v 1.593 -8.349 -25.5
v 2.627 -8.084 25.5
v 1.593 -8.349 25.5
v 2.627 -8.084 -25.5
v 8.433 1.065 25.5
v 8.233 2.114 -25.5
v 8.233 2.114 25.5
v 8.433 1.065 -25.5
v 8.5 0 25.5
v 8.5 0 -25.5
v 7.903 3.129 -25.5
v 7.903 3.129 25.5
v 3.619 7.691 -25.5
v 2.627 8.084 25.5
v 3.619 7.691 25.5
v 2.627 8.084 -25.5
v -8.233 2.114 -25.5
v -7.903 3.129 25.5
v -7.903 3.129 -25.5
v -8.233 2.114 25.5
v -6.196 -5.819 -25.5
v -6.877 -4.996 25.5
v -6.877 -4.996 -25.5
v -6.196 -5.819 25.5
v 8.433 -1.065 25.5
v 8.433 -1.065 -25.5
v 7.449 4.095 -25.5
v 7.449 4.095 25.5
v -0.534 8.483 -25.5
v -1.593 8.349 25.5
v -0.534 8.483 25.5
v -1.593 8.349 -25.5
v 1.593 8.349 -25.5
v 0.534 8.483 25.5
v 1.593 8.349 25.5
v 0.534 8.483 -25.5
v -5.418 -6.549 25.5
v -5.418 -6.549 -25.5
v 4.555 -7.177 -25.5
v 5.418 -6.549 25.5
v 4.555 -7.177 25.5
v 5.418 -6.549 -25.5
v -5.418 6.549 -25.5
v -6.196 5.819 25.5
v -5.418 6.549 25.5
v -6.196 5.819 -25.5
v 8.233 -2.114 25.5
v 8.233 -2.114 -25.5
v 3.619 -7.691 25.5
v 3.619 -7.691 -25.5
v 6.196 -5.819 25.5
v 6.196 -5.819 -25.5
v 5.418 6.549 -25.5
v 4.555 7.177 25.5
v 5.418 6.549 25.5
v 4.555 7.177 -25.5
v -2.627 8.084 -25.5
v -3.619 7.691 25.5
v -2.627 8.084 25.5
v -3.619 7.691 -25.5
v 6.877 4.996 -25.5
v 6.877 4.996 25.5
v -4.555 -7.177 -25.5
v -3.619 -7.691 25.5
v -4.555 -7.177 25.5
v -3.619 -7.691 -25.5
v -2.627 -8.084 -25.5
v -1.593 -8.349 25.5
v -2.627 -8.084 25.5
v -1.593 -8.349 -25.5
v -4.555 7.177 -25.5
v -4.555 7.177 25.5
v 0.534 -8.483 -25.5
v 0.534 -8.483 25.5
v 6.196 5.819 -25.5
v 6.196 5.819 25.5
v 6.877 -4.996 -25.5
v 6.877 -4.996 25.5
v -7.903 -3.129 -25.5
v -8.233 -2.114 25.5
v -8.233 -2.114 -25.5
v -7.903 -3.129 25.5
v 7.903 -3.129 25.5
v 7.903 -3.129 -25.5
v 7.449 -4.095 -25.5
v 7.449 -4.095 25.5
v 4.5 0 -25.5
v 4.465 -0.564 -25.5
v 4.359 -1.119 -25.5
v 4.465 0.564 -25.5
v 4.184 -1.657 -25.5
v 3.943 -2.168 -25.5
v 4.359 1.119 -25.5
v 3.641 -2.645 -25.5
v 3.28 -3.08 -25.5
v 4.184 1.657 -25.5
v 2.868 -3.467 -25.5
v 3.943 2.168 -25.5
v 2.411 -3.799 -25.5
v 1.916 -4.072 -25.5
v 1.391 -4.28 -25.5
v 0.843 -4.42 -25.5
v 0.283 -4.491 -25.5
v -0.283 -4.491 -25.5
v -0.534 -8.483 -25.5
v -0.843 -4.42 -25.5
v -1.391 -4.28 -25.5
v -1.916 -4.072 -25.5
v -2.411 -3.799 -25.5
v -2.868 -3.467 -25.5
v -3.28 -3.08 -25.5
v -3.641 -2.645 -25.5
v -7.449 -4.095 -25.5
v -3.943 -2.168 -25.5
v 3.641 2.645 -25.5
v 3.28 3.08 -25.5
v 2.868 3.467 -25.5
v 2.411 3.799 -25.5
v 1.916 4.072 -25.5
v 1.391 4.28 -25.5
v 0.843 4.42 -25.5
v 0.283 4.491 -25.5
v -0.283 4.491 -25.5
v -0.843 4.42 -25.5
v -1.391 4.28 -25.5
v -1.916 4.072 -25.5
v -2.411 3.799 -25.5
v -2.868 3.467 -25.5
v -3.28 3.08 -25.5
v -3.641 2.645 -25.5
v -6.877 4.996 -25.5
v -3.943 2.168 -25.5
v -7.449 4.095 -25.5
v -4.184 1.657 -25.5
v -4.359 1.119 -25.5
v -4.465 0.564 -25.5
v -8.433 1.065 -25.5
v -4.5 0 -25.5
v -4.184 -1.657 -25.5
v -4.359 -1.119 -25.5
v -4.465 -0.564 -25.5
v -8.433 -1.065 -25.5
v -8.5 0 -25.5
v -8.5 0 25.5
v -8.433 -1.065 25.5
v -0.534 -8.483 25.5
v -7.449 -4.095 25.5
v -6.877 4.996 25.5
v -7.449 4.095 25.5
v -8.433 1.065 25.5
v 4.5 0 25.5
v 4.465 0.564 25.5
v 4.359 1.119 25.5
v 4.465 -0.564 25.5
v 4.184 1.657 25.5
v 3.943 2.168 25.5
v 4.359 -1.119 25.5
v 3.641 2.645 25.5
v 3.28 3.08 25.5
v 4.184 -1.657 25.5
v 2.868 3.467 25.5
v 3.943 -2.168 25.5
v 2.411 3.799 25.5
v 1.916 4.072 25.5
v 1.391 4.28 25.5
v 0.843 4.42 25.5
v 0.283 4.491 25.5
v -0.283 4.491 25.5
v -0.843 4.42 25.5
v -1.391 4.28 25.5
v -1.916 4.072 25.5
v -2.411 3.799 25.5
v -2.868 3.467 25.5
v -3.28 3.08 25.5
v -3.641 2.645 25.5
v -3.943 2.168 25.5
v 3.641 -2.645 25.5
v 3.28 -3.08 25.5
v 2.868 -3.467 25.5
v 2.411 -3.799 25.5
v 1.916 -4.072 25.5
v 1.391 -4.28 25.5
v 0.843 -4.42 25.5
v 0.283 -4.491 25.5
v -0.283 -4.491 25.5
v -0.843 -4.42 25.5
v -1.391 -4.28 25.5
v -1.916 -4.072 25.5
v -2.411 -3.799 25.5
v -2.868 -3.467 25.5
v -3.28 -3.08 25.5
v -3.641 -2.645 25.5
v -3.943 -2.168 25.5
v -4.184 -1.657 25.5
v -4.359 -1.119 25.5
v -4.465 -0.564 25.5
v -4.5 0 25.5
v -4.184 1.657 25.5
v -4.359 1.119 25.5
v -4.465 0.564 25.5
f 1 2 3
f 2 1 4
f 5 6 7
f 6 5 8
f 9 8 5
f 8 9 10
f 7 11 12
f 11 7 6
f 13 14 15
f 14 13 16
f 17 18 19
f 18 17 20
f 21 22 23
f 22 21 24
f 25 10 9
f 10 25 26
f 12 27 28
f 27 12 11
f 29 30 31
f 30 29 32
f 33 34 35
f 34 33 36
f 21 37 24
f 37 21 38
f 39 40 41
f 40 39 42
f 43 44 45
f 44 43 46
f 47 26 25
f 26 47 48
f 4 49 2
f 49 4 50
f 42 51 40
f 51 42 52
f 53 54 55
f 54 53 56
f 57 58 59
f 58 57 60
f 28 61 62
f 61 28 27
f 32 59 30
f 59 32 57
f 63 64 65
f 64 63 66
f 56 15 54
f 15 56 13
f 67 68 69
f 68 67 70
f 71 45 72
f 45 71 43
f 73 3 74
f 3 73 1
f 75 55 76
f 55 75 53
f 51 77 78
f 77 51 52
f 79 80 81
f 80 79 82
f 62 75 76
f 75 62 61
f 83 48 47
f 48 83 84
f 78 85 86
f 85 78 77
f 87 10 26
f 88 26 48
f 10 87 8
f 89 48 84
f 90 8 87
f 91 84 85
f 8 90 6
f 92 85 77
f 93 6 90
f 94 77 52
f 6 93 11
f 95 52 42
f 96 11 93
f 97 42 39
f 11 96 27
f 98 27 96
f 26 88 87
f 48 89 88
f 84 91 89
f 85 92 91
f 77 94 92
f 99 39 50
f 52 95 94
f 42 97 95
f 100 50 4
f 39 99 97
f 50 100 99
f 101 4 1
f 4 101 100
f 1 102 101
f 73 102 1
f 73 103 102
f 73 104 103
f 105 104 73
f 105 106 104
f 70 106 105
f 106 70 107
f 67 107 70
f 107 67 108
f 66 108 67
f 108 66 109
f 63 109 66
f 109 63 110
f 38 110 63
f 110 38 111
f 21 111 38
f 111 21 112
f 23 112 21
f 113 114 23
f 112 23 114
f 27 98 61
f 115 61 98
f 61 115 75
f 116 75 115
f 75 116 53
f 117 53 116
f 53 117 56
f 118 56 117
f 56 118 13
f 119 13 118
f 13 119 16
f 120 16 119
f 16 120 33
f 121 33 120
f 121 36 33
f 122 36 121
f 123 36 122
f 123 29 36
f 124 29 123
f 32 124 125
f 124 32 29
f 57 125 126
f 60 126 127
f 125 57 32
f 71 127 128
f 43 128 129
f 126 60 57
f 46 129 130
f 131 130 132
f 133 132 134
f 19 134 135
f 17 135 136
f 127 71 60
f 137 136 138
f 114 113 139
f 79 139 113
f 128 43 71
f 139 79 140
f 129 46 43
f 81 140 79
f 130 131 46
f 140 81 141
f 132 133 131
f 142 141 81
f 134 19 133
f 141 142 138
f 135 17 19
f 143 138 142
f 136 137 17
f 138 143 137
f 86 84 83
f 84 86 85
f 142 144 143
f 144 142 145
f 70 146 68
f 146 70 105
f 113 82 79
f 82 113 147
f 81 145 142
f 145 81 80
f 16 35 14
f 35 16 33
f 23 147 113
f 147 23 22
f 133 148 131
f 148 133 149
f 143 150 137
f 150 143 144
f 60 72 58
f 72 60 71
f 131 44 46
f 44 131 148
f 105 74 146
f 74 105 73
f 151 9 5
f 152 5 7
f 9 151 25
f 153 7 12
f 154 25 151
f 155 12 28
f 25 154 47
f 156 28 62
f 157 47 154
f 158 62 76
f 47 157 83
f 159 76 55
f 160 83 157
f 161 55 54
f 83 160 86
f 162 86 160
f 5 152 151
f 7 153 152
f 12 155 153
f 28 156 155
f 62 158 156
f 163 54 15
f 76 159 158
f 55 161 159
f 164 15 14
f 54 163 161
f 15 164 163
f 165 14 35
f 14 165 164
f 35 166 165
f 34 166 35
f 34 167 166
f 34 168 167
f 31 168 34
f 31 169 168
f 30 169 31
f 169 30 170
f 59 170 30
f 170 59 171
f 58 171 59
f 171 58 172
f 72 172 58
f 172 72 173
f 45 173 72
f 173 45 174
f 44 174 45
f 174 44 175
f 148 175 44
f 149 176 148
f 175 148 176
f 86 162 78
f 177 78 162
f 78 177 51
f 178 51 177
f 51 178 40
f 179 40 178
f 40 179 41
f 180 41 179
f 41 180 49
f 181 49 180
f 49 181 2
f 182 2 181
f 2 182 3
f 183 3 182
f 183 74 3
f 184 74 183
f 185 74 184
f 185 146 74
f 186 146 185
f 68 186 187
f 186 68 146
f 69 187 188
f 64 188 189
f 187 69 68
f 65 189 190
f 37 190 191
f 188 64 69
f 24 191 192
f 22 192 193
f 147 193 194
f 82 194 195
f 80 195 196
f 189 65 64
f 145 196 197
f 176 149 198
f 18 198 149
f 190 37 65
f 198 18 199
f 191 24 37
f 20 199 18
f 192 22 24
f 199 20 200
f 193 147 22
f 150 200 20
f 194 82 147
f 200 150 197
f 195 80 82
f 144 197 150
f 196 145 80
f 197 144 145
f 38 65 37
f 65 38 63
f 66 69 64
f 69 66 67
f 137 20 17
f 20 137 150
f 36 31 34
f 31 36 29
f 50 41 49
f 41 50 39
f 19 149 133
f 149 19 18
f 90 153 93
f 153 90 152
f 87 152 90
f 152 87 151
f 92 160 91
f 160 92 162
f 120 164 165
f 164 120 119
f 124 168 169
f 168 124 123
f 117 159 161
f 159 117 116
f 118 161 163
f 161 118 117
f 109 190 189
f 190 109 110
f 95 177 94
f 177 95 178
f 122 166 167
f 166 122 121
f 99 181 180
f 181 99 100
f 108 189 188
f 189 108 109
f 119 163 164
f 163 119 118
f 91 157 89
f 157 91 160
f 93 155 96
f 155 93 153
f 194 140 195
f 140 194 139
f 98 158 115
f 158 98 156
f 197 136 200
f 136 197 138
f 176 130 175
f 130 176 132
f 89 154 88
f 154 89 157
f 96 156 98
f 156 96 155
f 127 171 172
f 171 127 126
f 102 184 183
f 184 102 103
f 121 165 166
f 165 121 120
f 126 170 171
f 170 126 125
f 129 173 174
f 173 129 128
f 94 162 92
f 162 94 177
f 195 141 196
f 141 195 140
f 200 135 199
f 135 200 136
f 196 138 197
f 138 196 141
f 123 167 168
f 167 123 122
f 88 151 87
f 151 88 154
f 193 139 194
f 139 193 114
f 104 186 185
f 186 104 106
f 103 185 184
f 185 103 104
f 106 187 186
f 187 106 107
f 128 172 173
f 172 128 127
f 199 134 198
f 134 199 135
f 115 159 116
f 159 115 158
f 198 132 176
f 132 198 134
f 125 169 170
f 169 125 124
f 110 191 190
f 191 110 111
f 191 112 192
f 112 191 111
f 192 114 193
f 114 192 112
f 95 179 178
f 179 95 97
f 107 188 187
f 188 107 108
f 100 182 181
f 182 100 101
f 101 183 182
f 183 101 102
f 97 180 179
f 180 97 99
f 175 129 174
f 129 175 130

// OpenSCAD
$fn = 50;


difference() {
	union() {
		translate(v = [0, 0, -25.5000000000]) {
			cylinder(h = 51, r = 8.5000000000);
		}
	}
	union() {
		translate(v = [0, 0, -100.0000000000]) {
			cylinder(h = 200, r = 4.5000000000);
		}
	}
}
